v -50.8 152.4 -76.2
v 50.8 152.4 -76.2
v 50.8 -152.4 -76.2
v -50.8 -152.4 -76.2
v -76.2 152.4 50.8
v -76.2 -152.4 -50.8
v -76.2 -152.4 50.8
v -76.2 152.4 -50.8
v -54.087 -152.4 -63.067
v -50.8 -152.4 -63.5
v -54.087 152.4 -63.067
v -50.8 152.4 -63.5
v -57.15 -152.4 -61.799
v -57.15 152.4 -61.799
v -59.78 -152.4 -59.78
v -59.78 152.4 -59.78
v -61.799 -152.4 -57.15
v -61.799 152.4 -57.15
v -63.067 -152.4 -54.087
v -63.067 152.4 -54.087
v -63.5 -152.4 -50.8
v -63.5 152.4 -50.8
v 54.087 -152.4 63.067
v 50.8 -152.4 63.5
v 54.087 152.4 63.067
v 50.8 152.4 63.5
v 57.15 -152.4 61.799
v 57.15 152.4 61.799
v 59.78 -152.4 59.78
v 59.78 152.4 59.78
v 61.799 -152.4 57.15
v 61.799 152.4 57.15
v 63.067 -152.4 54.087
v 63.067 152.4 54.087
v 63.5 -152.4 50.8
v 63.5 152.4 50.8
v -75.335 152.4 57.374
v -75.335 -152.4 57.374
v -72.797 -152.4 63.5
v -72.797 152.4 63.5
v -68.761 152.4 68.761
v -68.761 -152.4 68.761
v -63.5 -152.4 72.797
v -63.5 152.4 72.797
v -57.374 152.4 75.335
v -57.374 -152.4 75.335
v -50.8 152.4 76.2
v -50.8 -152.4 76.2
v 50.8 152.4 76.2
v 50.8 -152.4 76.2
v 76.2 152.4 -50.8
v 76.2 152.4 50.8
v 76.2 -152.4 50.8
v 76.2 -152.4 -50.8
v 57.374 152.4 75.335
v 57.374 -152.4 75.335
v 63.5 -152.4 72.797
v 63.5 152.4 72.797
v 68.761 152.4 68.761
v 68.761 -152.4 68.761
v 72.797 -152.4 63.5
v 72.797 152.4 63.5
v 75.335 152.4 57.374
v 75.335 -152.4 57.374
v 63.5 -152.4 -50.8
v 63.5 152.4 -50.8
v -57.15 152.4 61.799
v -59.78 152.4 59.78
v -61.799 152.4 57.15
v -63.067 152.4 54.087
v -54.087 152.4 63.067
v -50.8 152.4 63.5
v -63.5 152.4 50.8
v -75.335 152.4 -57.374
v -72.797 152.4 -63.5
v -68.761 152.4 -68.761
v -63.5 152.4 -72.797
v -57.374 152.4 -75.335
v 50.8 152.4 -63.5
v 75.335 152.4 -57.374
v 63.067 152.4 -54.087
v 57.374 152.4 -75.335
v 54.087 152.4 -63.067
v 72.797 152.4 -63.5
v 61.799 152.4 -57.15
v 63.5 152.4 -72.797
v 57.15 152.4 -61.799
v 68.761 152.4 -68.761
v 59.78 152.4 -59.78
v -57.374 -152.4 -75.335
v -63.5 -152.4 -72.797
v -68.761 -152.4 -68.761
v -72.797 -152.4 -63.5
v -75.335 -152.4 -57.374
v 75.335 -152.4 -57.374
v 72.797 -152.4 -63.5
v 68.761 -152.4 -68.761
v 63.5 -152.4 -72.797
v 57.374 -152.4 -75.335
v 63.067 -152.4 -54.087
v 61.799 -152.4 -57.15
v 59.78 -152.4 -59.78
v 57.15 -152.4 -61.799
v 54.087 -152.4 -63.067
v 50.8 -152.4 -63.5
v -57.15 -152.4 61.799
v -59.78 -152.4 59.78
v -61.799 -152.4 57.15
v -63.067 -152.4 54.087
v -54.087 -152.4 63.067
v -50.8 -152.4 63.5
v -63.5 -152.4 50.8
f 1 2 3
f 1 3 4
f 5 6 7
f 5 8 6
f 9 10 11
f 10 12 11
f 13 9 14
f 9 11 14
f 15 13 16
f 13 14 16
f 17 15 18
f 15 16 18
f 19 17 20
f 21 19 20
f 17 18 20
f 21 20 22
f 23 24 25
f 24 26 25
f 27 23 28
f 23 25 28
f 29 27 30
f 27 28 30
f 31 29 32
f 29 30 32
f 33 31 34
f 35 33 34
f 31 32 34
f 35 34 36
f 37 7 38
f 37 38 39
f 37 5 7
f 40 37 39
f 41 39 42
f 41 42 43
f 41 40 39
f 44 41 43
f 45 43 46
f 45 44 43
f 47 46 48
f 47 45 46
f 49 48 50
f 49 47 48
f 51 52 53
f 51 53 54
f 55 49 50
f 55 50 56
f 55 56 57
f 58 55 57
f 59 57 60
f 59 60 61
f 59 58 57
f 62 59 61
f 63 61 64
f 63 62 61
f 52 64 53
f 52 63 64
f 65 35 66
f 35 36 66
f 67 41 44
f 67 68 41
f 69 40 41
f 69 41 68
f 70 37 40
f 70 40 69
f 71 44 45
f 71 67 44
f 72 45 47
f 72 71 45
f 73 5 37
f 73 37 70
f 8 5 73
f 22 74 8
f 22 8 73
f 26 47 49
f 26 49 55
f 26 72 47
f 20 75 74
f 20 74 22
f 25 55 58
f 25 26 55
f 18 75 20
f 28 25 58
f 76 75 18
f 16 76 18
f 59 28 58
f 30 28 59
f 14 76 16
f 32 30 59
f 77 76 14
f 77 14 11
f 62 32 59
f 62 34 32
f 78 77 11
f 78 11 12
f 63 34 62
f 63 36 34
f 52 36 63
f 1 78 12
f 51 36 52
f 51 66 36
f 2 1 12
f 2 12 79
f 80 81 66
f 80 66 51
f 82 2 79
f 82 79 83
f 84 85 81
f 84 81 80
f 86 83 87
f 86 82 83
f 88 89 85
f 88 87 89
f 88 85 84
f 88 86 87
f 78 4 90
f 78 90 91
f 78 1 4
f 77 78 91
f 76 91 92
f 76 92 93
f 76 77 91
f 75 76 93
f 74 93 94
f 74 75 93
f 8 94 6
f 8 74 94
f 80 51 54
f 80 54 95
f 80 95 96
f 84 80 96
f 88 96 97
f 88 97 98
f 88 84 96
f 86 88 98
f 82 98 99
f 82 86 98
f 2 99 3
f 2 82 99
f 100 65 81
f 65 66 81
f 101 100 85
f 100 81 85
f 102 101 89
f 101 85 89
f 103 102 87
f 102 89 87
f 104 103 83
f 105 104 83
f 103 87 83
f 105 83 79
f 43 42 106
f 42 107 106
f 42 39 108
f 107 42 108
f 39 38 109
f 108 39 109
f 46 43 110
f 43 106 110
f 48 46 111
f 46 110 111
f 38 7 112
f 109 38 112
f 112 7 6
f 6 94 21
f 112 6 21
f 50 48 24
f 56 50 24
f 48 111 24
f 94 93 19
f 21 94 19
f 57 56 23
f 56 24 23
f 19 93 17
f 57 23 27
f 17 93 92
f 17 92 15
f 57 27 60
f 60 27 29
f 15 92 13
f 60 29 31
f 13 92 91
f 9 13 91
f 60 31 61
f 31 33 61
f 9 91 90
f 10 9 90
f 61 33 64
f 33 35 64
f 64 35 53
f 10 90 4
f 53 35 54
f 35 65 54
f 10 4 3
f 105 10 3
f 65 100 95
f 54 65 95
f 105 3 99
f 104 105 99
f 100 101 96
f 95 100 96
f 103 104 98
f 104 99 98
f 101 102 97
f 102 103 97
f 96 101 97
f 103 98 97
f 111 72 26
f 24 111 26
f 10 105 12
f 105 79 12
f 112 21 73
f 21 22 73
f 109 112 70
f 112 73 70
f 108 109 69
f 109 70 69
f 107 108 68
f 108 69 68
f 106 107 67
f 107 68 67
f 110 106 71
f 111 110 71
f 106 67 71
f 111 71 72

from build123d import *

# Parameters (mm, degrees)
BOSS_EXTRUDE1_DEPTH = 152.4


with BuildPart() as part:
    # Sketch1 → Boss-Extrude1 (new body, symmetric)
    with BuildSketch(Plane(origin=(0, 0, 0), x_dir=(1, 0, 0), z_dir=(0, 1, 0))):
        with BuildLine():
            Line((-50.8, -76.2), (50.8, -76.2))
            ThreePointArc((50.8, -76.2), (68.760512242, -68.760512242), (76.2, -50.8))
            Line((76.2, -50.8), (76.2, 50.8))
            ThreePointArc((76.2, 50.8), (68.760512242, 68.760512242), (50.8, 76.2))
            Line((50.8, 76.2), (-50.8, 76.2))
            ThreePointArc((-50.8, 76.2), (-68.760512242, 68.760512242), (-76.2, 50.8))
            Line((-76.2, 50.8), (-76.2, -50.8))
            ThreePointArc((-76.2, -50.8), (-68.760512242, -68.760512242), (-50.8, -76.2))
        make_face()
        with BuildLine():
            Line((-50.8, -63.5), (50.8, -63.5))
            ThreePointArc((50.8, -63.5), (59.780256121, -59.780256121), (63.5, -50.8))
            Line((63.5, -50.8), (63.5, 50.8))
            ThreePointArc((63.5, 50.8), (59.780256121, 59.780256121), (50.8, 63.5))
            Line((50.8, 63.5), (-50.8, 63.5))
            ThreePointArc((-50.8, 63.5), (-59.780256121, 59.780256121), (-63.5, 50.8))
            Line((-63.5, 50.8), (-63.5, -50.8))
            ThreePointArc((-63.5, -50.8), (-59.780256121, -59.780256121), (-50.8, -63.5))
        make_face(mode=Mode.SUBTRACT)
    extrude(amount=BOSS_EXTRUDE1_DEPTH, both=True)


solid = part.part
